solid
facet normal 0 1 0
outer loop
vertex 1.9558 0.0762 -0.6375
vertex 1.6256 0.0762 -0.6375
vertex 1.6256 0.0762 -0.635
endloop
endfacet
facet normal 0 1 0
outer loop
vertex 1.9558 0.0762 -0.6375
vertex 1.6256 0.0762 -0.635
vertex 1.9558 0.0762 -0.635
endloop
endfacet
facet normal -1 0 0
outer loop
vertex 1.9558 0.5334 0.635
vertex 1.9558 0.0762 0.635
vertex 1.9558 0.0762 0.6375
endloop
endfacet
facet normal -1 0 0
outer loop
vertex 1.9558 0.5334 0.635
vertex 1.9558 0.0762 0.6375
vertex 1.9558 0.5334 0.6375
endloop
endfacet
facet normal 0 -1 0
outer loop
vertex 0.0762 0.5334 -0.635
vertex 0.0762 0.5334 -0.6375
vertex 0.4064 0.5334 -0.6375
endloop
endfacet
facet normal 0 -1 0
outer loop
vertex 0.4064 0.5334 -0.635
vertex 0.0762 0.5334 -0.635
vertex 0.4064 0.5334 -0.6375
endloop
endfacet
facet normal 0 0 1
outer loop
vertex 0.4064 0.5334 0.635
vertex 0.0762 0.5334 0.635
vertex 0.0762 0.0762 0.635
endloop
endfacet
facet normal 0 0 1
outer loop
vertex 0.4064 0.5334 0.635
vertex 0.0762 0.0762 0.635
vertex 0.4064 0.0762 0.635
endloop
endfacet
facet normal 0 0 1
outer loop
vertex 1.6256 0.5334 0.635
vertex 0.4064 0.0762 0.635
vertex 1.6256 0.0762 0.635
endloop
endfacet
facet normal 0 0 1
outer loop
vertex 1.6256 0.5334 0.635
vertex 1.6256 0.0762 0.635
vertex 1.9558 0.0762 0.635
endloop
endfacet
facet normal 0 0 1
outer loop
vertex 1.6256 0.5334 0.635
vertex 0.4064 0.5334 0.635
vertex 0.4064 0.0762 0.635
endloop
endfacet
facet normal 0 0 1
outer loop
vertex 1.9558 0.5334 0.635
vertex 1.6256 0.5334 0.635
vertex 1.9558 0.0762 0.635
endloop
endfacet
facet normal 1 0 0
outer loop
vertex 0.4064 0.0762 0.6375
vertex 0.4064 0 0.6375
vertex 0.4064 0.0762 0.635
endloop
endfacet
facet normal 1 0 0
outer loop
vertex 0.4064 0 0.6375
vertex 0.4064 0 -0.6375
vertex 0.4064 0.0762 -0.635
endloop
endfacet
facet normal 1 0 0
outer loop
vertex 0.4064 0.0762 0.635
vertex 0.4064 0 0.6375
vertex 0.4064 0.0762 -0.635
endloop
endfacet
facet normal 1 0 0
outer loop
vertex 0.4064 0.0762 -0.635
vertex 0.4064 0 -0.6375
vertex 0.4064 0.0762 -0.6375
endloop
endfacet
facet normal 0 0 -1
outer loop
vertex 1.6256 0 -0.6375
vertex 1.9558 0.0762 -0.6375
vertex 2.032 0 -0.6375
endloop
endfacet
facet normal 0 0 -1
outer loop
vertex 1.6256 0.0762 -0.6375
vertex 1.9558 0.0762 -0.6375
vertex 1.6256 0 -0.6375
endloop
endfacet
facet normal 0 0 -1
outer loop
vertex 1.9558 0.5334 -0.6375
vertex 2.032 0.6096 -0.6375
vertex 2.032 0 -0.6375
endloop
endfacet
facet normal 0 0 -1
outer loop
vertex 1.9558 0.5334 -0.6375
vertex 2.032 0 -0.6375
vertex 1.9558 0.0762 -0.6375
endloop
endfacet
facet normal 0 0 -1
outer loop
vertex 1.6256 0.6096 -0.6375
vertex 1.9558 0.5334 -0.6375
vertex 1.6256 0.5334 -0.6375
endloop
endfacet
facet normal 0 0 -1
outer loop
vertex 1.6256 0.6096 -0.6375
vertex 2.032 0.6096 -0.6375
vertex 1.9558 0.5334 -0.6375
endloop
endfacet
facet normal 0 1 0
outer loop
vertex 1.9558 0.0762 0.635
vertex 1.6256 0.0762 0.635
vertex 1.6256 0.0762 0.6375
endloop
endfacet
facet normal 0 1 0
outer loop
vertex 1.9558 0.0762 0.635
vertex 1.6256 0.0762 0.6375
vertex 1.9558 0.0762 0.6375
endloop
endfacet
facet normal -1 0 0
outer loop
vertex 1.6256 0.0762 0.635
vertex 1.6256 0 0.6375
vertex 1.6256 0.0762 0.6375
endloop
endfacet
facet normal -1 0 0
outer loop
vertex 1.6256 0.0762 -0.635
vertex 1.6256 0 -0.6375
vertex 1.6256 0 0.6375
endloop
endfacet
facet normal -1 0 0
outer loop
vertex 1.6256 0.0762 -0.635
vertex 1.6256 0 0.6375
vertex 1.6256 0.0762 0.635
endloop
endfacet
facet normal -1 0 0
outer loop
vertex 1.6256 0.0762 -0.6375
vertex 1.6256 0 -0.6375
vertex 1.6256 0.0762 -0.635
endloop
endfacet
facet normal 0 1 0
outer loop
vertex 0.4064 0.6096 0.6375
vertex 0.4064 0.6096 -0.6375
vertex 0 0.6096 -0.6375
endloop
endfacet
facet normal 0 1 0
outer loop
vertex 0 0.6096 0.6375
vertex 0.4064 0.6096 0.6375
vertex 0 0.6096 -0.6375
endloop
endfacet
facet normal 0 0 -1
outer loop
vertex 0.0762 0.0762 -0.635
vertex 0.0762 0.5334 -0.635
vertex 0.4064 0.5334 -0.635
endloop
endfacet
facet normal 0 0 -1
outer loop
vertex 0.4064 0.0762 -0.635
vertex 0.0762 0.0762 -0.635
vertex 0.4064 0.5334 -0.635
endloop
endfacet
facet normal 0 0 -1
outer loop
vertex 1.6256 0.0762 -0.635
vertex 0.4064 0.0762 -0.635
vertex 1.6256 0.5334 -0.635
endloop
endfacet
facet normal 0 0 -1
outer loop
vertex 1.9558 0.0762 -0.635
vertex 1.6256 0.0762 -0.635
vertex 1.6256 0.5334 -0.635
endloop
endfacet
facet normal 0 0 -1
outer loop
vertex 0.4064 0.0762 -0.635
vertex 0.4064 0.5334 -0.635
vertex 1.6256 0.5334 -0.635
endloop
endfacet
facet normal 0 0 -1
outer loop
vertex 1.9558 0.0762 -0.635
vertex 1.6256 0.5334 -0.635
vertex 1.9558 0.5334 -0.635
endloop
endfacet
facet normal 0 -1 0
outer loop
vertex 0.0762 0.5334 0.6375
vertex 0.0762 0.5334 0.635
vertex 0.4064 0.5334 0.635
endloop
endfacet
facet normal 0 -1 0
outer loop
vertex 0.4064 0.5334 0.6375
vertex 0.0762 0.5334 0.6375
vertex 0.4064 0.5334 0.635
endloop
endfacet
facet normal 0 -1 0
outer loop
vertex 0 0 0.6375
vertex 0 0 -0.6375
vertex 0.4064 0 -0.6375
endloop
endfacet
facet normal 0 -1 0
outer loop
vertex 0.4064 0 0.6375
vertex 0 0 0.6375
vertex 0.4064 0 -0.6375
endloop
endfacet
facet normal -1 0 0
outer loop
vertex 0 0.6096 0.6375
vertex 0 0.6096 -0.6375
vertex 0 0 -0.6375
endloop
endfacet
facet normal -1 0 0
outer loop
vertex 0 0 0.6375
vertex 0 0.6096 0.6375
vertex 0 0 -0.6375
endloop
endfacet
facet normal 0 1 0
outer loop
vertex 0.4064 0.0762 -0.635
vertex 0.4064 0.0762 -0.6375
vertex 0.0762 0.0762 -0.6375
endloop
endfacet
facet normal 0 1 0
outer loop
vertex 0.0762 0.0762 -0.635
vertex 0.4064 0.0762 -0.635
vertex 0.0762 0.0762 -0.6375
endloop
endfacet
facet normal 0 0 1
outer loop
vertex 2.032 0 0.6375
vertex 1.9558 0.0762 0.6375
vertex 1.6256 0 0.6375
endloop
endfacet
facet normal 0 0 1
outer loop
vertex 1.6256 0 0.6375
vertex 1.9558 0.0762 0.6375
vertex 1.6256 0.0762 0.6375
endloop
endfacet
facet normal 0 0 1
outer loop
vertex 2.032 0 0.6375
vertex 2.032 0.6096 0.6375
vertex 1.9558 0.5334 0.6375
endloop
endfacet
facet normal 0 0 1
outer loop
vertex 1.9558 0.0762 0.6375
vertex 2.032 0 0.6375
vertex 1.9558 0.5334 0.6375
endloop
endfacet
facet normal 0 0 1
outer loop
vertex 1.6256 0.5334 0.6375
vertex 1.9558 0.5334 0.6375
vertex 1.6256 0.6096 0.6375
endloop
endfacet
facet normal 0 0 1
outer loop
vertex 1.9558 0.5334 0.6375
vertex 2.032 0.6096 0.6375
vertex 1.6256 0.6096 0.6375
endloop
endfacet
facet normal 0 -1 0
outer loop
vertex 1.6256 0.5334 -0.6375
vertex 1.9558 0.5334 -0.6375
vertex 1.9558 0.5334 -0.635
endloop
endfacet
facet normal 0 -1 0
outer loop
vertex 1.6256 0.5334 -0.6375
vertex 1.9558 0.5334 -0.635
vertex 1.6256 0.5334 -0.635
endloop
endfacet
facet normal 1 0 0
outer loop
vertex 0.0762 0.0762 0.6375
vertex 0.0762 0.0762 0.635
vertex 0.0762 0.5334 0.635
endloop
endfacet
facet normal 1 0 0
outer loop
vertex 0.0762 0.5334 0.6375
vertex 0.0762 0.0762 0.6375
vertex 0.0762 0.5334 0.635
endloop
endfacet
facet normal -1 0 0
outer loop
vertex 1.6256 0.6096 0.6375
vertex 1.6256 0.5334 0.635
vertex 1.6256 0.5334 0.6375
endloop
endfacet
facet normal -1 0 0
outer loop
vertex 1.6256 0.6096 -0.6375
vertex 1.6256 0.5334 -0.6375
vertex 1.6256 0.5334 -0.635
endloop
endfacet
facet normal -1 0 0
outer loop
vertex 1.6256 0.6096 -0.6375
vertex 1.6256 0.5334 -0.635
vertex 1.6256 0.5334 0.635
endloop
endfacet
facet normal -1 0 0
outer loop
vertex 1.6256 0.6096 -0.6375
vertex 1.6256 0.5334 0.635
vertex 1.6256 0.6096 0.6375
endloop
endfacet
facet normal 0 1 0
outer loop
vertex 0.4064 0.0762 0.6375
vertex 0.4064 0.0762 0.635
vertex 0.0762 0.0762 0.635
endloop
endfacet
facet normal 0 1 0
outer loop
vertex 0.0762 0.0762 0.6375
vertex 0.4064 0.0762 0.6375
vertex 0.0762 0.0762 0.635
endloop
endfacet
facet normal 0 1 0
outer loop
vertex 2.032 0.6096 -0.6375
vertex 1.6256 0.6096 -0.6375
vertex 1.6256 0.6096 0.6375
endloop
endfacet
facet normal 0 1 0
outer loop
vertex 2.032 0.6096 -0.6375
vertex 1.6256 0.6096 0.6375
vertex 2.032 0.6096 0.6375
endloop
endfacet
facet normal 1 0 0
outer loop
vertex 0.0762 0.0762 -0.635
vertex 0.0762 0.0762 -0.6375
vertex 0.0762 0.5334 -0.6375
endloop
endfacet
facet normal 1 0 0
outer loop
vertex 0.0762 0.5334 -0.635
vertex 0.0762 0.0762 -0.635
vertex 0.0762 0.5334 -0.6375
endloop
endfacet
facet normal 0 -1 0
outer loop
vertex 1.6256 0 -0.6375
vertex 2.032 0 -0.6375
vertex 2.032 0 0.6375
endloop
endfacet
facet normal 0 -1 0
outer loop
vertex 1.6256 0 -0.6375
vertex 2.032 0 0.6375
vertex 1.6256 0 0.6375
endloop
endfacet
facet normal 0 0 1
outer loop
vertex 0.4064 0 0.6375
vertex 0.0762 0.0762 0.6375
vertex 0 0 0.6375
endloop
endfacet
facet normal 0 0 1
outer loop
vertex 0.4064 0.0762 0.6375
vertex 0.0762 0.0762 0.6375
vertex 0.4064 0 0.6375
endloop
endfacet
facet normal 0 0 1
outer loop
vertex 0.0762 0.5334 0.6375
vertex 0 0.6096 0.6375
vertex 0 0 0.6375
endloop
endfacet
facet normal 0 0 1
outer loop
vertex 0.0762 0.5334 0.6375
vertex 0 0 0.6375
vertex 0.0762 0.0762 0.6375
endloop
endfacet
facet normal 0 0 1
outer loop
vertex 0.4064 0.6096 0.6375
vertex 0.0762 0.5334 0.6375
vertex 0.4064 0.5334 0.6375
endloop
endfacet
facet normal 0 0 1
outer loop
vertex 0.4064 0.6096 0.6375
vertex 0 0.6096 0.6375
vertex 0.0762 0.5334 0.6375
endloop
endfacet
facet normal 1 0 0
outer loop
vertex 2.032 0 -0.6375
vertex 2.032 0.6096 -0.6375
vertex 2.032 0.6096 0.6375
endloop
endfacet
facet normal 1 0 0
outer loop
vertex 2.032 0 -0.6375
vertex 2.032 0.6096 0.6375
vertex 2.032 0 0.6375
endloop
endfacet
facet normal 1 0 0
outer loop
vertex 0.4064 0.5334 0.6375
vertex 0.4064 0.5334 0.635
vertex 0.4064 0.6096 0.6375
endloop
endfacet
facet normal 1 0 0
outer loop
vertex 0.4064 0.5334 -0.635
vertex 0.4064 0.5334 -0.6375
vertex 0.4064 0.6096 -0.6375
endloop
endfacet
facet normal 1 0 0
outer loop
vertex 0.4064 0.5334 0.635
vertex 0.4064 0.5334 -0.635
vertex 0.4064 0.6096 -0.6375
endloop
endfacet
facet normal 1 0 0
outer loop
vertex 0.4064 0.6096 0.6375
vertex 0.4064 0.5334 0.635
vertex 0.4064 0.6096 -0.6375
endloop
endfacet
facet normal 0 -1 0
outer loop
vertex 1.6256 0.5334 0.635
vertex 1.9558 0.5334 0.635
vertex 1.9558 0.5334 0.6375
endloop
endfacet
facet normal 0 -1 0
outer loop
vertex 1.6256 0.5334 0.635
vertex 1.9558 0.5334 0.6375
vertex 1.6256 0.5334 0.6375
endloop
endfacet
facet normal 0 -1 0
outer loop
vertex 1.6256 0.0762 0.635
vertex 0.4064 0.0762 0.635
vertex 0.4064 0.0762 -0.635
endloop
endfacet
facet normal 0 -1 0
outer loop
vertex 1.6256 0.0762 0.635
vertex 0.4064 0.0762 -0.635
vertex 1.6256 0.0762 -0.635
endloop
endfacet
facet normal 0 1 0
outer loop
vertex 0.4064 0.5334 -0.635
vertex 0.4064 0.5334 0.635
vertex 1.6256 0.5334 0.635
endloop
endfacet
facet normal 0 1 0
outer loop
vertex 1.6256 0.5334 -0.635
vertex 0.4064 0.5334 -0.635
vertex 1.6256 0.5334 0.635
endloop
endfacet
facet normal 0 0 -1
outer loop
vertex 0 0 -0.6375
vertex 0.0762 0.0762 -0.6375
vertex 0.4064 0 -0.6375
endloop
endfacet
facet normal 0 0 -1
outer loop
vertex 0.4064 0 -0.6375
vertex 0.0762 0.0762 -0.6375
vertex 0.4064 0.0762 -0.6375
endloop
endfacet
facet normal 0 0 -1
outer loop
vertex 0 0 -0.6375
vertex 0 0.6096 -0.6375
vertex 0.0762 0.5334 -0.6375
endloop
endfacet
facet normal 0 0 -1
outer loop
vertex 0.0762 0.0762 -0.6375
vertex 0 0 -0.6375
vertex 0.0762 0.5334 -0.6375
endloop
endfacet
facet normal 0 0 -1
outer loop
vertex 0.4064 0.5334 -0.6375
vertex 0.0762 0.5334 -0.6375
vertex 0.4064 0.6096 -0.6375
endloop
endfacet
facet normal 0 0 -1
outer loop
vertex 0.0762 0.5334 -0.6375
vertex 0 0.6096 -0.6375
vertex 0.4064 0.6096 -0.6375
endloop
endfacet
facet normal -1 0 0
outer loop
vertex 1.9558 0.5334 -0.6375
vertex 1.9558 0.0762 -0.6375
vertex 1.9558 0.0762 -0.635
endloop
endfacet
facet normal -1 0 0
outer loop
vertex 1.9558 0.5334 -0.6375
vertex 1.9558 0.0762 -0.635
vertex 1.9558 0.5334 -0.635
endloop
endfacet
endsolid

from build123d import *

# Parameters (mm, degrees)
SKETCH1_W           = 1.8796
SKETCH1_H           = 0.4572
BASE_EXTRUDE_DEPTH  = 0.635
BOSS_EXTRUDE1_DEPTH = 1.27508


with BuildPart() as part:
    # Sketch1 → Base-Extrude (new body, symmetric)
    with BuildSketch(Plane.XY):
        with Locations((1.016, 0.3048)):
            Rectangle(SKETCH1_W, SKETCH1_H)
    extrude(amount=BASE_EXTRUDE_DEPTH, both=True)

    # Sketch2 → Boss-Extrude1 (add)
    with BuildSketch(Plane(origin=(0, 0, -0.63754), x_dir=(-1, 0, 0), z_dir=(0, 0, -1))):
        Polygon((0, 0), (-0.4064, 0), (-0.4064, 0.0762), (-0.0762, 0.0762), (-0.0762, 0.5334), (-0.4064, 0.5334), (-0.4064, 0.6096), (0, 0.6096), align=None)
    boss_extrude1 = extrude(amount=-BOSS_EXTRUDE1_DEPTH)

    # Mirror1: Boss-Extrude1 across plane
    add(boss_extrude1.mirror(Plane(origin=(1.016, 0, 0), x_dir=(0, 0, 1), z_dir=(1, 0, 0))))


solid = part.part
